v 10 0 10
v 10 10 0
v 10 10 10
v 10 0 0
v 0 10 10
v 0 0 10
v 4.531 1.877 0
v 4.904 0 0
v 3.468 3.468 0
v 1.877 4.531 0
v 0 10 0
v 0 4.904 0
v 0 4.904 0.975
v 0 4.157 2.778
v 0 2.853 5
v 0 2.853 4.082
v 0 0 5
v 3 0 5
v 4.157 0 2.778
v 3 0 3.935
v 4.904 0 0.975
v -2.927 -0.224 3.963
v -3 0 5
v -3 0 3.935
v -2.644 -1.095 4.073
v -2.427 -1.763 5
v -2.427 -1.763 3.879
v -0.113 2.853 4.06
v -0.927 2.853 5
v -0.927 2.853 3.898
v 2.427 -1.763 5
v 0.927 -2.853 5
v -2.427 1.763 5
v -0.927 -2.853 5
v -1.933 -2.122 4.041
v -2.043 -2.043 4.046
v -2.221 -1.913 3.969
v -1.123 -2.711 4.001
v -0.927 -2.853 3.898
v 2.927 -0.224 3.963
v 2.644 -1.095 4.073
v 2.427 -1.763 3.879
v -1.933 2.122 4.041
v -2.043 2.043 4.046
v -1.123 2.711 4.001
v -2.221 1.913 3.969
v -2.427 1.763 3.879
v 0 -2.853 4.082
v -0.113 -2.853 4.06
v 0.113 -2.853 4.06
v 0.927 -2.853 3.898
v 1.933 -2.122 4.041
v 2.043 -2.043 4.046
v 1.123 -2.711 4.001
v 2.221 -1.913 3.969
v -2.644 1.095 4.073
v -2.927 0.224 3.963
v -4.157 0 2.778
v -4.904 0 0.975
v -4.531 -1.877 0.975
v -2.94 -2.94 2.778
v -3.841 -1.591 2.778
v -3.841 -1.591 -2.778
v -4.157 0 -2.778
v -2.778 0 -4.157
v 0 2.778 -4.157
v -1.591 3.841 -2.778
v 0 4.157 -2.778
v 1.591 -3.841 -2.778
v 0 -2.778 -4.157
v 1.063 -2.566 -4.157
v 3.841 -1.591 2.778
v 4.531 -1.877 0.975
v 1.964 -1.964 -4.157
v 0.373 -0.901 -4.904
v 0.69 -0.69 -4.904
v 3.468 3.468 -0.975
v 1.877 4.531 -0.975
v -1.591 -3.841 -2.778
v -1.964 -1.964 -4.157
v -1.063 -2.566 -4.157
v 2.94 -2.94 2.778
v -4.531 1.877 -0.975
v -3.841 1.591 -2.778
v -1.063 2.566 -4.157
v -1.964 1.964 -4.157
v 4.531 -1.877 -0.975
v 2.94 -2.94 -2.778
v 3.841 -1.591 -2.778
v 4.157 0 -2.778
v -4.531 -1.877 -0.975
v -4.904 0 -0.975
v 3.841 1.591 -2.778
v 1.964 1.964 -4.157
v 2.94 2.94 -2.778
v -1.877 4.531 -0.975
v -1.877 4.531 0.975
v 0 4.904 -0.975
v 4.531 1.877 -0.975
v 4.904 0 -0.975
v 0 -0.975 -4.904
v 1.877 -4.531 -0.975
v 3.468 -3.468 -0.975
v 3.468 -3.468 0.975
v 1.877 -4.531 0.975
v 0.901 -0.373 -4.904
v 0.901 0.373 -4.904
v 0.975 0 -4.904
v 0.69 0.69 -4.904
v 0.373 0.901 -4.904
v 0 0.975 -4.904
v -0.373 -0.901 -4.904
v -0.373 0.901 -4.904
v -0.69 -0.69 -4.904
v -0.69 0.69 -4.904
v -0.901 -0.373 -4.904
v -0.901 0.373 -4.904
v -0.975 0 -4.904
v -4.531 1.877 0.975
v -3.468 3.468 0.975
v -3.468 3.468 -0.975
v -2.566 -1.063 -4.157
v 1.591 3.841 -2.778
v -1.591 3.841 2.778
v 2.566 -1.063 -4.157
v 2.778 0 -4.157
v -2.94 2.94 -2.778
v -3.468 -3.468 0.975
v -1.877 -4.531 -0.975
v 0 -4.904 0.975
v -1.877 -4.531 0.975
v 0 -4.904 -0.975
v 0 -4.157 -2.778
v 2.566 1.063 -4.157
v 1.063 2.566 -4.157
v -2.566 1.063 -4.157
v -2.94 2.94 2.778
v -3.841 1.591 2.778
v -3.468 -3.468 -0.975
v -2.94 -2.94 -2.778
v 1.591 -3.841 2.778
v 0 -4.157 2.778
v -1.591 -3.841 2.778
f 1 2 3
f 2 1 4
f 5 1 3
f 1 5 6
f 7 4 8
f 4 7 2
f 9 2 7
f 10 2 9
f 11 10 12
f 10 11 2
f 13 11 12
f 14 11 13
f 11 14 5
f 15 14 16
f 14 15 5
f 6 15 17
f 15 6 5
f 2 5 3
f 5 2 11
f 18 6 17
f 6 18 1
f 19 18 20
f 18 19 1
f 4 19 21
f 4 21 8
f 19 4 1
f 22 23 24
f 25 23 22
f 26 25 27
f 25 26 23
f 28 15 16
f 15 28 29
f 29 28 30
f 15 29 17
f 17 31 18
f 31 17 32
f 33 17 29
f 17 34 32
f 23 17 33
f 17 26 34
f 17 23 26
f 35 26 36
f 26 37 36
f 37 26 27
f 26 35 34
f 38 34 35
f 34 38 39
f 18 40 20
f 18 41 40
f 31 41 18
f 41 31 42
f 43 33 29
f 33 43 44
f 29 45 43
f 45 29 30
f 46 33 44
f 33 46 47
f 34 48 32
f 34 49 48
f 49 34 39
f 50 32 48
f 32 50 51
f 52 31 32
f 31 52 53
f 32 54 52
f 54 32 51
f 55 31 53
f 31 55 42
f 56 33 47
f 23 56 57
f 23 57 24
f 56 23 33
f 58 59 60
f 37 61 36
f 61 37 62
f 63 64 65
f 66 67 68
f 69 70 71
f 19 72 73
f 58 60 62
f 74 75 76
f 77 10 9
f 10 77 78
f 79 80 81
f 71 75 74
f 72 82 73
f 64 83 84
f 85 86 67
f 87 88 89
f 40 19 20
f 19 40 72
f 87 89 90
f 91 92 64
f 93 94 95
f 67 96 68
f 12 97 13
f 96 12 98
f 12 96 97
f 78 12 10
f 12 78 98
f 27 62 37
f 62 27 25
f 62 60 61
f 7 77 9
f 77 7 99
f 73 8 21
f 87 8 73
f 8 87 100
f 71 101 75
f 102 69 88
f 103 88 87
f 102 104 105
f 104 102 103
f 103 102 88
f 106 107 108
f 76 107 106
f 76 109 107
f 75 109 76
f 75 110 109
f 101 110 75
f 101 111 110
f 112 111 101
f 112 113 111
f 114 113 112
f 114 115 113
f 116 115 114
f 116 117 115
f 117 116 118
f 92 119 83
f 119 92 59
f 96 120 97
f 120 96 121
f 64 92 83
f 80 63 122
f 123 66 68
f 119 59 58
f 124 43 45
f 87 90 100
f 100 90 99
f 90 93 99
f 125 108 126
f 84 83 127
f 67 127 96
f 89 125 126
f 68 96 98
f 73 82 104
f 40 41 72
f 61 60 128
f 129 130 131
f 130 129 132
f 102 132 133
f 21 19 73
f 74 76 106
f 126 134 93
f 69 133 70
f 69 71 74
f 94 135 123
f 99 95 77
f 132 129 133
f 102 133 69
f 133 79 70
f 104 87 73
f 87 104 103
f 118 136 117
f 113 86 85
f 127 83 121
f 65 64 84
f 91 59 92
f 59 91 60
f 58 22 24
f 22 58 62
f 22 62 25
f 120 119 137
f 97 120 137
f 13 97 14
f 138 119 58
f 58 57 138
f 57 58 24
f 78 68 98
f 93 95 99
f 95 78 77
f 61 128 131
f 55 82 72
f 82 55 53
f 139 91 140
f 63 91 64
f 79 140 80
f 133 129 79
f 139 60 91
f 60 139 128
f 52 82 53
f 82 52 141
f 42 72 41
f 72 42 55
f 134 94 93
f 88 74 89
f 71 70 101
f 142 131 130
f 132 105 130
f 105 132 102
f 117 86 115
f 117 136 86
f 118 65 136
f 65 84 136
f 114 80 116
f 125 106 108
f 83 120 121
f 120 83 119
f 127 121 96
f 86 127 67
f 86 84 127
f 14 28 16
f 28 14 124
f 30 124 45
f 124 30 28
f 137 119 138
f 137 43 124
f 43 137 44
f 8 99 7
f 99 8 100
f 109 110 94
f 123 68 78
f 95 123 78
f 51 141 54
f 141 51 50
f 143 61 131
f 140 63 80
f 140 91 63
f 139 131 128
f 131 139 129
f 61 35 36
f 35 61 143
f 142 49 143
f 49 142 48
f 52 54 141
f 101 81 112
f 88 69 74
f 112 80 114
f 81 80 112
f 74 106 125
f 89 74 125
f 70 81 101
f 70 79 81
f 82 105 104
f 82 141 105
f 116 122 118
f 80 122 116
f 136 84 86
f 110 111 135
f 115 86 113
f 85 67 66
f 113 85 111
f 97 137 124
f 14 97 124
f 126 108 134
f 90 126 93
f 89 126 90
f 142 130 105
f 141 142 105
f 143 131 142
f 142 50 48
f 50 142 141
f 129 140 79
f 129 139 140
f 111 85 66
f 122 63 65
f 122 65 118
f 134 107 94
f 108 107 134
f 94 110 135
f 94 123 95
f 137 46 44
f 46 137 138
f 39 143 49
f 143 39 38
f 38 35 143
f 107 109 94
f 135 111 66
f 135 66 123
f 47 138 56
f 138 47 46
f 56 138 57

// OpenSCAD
module wrap() {
    children();
}
module box_children() {
    cube(10);
    children();
}
wrap() sphere(5);
box_children() cylinder(h=5, r1=3, r2=3);
